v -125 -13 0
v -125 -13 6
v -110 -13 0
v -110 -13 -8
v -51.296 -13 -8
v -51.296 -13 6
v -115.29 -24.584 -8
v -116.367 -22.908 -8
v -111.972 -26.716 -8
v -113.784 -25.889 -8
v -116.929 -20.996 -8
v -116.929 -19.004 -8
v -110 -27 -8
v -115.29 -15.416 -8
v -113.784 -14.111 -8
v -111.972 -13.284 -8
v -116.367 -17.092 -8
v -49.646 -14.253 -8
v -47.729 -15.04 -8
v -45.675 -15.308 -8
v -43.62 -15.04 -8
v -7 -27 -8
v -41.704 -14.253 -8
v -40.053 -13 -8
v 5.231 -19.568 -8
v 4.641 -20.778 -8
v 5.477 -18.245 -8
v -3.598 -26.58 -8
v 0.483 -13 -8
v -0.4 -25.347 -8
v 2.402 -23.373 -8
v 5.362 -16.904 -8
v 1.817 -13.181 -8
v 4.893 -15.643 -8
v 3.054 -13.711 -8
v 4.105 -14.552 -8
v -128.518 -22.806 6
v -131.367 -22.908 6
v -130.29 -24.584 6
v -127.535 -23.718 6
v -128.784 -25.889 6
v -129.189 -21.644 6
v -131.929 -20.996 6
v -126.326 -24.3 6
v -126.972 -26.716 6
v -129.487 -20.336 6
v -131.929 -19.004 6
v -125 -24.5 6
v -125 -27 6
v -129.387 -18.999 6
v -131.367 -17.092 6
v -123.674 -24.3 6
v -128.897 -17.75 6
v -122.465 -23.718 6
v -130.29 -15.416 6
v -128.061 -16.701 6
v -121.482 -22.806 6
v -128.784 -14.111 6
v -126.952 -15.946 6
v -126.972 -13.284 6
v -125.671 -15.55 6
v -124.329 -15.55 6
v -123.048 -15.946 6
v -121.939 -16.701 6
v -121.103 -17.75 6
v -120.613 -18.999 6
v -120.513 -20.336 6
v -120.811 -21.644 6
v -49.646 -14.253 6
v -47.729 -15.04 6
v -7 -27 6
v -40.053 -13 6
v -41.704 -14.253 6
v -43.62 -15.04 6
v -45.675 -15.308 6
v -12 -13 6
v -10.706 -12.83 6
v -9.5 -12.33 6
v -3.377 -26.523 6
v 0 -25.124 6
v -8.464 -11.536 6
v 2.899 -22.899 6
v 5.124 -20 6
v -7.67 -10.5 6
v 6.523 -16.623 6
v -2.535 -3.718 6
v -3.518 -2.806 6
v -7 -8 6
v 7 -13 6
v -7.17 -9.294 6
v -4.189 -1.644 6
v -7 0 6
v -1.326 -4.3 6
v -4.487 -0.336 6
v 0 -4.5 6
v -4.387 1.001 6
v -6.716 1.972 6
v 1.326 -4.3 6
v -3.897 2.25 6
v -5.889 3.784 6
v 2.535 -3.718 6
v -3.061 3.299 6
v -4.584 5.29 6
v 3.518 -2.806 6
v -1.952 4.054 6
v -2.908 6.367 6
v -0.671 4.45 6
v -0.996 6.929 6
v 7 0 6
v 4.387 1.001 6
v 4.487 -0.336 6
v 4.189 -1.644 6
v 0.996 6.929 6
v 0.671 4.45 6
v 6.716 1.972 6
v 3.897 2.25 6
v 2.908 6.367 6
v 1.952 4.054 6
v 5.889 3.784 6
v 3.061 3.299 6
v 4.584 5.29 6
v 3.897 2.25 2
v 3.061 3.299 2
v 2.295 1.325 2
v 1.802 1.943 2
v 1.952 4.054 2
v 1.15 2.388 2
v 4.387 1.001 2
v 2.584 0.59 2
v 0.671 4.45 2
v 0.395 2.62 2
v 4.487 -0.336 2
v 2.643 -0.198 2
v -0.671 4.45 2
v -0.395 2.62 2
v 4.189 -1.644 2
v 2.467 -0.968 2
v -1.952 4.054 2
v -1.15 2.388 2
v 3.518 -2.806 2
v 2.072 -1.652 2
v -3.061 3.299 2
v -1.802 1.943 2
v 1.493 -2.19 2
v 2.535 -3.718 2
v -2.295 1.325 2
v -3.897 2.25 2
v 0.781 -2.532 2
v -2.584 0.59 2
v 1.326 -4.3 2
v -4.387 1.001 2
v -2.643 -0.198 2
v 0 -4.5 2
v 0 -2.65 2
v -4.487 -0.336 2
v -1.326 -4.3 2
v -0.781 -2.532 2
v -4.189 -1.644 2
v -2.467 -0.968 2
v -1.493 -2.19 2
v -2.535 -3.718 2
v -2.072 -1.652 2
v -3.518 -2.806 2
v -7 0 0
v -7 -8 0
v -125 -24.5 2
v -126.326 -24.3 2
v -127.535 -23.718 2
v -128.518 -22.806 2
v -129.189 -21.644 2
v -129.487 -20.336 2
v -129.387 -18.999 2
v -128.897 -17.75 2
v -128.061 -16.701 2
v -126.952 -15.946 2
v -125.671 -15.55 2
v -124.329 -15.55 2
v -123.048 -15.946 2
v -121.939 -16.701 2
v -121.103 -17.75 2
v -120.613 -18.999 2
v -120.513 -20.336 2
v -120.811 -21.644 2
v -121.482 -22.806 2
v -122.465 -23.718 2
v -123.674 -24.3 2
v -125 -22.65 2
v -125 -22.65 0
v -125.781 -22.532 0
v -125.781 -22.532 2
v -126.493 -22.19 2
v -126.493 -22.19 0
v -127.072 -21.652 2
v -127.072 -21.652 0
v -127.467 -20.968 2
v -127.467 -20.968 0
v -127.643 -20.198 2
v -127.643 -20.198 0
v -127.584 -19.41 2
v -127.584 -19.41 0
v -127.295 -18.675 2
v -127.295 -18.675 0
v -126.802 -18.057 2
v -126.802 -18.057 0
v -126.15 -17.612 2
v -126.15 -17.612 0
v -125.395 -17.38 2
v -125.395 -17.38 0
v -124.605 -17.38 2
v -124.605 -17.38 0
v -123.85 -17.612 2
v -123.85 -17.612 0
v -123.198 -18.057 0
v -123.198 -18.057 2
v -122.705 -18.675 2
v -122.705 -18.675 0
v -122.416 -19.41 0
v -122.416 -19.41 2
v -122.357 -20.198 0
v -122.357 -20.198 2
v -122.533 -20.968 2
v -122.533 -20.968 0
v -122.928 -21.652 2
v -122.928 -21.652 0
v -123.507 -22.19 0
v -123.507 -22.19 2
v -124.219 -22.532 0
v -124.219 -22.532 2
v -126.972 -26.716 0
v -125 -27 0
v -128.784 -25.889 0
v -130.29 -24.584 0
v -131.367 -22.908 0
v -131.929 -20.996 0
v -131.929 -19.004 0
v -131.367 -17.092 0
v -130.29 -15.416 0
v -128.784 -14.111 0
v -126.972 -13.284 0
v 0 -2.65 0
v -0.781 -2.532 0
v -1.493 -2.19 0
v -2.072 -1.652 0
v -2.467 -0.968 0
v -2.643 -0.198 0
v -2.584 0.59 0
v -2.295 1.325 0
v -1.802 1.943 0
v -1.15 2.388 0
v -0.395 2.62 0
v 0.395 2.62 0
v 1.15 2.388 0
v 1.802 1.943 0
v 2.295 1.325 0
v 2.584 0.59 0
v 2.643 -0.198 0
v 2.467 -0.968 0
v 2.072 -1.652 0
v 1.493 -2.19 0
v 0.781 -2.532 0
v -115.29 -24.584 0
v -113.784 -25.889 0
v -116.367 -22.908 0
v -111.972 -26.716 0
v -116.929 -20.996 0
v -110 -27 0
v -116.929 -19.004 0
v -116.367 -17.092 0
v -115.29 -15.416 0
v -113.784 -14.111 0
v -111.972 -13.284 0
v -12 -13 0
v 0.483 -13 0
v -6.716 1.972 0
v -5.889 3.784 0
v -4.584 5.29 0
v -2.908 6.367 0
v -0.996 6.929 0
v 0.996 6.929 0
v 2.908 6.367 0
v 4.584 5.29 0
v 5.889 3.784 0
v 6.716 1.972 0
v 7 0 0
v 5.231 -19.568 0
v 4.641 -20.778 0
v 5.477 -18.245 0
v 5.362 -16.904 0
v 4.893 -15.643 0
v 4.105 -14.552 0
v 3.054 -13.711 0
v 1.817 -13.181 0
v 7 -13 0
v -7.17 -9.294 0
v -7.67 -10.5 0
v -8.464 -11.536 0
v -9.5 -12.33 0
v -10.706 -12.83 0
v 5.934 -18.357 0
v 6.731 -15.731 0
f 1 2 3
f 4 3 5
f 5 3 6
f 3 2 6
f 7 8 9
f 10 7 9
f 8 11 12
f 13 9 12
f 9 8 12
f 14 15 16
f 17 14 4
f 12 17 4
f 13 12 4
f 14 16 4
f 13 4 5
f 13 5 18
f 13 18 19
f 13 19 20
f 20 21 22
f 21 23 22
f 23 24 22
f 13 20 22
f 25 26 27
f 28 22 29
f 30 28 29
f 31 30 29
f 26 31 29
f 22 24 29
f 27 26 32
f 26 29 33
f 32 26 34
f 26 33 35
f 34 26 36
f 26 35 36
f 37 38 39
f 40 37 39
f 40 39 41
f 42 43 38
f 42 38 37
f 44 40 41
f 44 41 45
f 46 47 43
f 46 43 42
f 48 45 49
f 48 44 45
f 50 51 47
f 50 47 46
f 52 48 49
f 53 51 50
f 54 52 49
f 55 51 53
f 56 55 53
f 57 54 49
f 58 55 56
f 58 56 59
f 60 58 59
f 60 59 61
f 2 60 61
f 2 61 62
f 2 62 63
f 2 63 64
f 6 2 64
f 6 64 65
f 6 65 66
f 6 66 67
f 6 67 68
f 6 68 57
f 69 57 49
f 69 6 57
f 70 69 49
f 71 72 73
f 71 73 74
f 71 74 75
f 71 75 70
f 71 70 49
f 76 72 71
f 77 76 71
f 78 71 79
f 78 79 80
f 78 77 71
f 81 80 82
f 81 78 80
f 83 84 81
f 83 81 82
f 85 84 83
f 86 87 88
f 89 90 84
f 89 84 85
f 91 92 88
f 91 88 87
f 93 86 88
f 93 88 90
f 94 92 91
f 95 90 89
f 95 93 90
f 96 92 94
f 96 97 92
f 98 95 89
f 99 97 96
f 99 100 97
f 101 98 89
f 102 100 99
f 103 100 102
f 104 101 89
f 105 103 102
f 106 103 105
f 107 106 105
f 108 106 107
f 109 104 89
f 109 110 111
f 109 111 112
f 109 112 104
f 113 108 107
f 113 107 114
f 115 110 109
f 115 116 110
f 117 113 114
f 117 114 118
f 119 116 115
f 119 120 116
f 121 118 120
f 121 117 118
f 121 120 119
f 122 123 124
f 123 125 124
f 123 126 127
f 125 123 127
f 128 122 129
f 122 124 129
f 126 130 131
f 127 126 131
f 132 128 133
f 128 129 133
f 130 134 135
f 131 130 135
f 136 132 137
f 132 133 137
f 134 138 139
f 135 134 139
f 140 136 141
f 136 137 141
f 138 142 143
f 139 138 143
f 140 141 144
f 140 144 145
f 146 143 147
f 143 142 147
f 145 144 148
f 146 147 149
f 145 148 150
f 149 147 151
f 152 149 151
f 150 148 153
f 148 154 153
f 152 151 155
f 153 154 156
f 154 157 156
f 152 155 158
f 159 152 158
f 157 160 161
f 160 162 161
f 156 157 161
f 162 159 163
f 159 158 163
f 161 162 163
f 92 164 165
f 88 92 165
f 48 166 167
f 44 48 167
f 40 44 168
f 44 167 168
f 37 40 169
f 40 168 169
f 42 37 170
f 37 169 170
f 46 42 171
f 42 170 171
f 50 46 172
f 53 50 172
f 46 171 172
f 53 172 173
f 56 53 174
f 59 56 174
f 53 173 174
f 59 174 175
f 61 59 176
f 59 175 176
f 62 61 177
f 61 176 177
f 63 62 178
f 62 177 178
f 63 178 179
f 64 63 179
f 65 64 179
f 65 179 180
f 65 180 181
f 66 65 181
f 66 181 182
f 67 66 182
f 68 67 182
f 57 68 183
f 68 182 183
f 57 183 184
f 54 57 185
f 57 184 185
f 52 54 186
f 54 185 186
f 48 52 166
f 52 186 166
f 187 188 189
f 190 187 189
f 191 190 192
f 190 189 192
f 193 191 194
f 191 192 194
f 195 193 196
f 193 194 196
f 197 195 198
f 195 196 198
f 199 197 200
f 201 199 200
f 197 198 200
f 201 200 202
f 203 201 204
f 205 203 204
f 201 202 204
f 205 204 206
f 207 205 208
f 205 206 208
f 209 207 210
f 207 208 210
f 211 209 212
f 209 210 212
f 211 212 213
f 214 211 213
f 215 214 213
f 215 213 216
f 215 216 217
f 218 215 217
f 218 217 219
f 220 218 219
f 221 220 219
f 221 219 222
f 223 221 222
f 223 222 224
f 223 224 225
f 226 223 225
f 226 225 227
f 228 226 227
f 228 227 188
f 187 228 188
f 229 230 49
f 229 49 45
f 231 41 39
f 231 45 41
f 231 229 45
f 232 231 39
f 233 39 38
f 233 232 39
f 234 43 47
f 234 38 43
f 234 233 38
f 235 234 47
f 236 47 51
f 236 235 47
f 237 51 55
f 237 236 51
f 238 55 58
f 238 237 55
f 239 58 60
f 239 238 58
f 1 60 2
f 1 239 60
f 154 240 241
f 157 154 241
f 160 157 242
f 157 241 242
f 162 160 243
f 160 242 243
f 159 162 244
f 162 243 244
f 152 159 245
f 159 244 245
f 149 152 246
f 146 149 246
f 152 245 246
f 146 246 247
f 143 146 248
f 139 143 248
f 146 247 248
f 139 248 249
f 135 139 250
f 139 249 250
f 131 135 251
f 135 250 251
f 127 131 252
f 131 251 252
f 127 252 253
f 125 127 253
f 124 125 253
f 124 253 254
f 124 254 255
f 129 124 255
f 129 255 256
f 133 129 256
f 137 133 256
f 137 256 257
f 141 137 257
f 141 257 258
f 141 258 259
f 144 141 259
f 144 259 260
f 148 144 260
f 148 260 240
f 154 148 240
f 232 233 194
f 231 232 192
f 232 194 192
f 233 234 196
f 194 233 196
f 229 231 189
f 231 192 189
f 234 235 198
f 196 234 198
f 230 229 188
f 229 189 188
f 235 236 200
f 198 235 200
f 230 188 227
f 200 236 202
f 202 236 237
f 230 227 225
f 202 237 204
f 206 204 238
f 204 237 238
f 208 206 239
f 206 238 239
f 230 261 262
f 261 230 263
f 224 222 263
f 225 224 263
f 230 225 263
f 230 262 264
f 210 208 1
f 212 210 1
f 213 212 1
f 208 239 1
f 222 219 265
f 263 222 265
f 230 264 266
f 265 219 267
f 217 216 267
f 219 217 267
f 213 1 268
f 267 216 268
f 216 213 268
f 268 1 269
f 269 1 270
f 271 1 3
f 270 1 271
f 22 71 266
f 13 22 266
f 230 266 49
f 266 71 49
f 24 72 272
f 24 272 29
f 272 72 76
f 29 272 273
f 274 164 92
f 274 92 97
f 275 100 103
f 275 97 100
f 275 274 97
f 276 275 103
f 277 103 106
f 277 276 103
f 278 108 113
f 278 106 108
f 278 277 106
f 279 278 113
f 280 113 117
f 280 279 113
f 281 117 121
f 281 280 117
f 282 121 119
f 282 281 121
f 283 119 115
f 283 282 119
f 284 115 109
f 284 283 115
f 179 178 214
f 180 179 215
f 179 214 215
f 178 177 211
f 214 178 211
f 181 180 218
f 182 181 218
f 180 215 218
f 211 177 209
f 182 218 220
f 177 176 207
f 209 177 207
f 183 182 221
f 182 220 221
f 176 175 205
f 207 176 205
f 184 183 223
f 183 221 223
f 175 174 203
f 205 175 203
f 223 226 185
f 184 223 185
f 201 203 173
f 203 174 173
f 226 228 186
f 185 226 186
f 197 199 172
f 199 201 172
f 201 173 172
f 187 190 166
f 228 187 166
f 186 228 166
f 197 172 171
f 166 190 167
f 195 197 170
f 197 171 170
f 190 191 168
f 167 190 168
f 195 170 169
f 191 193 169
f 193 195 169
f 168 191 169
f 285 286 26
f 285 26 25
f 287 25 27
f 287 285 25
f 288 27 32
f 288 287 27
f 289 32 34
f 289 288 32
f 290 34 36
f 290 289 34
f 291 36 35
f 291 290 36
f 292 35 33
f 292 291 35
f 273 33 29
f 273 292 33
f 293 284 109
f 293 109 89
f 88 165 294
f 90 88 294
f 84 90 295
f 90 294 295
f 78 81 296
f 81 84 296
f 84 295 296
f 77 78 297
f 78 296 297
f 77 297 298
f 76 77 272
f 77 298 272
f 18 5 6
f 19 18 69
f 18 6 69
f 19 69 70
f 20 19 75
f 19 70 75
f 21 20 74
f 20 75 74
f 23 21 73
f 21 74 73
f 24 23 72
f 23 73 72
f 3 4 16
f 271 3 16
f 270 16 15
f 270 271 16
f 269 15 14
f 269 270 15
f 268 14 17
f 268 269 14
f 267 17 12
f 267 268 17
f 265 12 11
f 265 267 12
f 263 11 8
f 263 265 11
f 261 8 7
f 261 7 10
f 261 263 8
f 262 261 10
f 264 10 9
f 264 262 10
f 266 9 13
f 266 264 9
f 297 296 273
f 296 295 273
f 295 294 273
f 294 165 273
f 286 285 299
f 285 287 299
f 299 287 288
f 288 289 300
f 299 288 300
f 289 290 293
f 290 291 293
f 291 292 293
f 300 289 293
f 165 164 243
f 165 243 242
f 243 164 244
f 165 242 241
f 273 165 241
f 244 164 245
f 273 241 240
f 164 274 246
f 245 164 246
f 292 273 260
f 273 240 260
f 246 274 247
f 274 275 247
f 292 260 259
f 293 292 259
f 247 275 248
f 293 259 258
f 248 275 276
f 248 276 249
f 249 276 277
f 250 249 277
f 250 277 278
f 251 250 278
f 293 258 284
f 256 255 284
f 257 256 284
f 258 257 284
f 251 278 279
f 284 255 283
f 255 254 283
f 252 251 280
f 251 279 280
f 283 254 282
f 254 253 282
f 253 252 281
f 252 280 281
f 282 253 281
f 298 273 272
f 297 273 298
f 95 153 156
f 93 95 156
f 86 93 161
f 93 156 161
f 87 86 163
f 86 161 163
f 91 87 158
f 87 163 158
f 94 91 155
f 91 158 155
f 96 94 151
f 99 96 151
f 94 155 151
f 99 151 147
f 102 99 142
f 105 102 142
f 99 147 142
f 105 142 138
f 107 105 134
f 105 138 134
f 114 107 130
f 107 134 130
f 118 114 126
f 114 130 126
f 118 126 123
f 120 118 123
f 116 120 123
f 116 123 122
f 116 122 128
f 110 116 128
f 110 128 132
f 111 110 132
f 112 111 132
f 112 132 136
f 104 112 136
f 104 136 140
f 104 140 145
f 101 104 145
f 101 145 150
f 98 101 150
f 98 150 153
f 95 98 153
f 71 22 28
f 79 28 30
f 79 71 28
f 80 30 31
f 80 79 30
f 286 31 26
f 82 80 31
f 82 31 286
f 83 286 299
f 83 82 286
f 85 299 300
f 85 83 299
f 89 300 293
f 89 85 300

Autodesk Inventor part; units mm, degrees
ref_plane "YZ Plane" through (0, 0, 0) normal (1, 0, 0) x (0, 1, 0)
ref_plane "XZ Plane" through (0, 0, 0) normal (0, 1, 0) x (-1, 0, 0)
ref_plane "XY Plane" through (0, 0, 0) normal (0, 0, 1) x (1, 0, 0)
sketch "Skizze1" plane through (0, 0, 0) normal (0, 0, 1) x (1, 0, 0)
  circle A0 centre (0, 0) radius 2.5
  line L0 (-7, 0) -> (-7, -8)
  line L1 (7, 0) -> (7, -13)
  arc A1 (7, 0) -> (-7, 0) centre (0, 0) ccw
  circle A2 centre (-125, -20) radius 2.5
  line L2 (-125, -13) -> (-12, -13)
  arc A3 (-125, -13) -> (-125, -27) centre (-125, -20) ccw
  line L3 (-7, -27) -> (-125, -27)
  arc A4 (-7, -27) -> (7, -13) centre (-7, -13) ccw
  arc A5 (-12, -13) -> (-7, -8) centre (-12, -8) ccw
  line L4 (-125, -20) -> (0, 0) construction
  circle A6 centre (-45.6749, -7.308) radius 8
  line L5 (-12, -13) -> (0.4833, -13)
  circle A7 centre (-125, -20) radius 7 construction
  arc A8 (-110, -13) -> (-110, -27) centre (-110, -20) ccw
  arc A9 (4.6407, -20.7778) -> (0.4833, -13) centre (0.4833, -18) ccw
  point P0 (-7, -13)
  point P1 (7, -27)
  point P2 (-127.0657, -26.6883)
  point P3 (-40.0535, -13)
  point P4 (-51.2964, -13)
  dimension "d0" = 5
  dimension "d14" = 125
  dimension "d30" = 7
  dimension "d31" = 20
  dimension "d32" = 14
  dimension "d33" = 5
  dimension "d34" = 80.334
  dimension "d37" = 16
  dimension "d47" = 1
  dimension "d48" = 5
extrude "Extrusion1" add sketch "Skizze1" along normal blind 6 contours A1 L1 A4 A9 L5 A5 L0 | L5 A9 A4 L3 A8 L2 A6 | A6 L2 | A8 L3 A3 L2 picked at (-47.0836, -13.3669)
extrude "Extrusion2" cut sketch "Skizze1" along normal through all contours A6 L2 picked at (-47.0836, -13.3669)
extrude "Extrusion3" add sketch "Skizze1" against normal blind 8 contours L5 A9 A4 L3 A8 L2 A6
sketch "Skizze2" plane through (0, 0, 6) normal (0, 0, 1) x (1, 0, 0)
  circle A0 centre (-125, -20) radius 2.5 projected
  circle A1 centre (0, 0) radius 2.5 projected
hole "Bohrung1" at (-125, -20, 6) at (0, 0, 6) direction (0, 0, -1) diameter 5.3 end through all counterbore diameter 9 counterbore depth 4 clearance for "Inbusschraube DIN EN ISO 4762" size "M5" standard "DIN"
properties part number "Door_Lever" material "ABS-Kunststoff"
